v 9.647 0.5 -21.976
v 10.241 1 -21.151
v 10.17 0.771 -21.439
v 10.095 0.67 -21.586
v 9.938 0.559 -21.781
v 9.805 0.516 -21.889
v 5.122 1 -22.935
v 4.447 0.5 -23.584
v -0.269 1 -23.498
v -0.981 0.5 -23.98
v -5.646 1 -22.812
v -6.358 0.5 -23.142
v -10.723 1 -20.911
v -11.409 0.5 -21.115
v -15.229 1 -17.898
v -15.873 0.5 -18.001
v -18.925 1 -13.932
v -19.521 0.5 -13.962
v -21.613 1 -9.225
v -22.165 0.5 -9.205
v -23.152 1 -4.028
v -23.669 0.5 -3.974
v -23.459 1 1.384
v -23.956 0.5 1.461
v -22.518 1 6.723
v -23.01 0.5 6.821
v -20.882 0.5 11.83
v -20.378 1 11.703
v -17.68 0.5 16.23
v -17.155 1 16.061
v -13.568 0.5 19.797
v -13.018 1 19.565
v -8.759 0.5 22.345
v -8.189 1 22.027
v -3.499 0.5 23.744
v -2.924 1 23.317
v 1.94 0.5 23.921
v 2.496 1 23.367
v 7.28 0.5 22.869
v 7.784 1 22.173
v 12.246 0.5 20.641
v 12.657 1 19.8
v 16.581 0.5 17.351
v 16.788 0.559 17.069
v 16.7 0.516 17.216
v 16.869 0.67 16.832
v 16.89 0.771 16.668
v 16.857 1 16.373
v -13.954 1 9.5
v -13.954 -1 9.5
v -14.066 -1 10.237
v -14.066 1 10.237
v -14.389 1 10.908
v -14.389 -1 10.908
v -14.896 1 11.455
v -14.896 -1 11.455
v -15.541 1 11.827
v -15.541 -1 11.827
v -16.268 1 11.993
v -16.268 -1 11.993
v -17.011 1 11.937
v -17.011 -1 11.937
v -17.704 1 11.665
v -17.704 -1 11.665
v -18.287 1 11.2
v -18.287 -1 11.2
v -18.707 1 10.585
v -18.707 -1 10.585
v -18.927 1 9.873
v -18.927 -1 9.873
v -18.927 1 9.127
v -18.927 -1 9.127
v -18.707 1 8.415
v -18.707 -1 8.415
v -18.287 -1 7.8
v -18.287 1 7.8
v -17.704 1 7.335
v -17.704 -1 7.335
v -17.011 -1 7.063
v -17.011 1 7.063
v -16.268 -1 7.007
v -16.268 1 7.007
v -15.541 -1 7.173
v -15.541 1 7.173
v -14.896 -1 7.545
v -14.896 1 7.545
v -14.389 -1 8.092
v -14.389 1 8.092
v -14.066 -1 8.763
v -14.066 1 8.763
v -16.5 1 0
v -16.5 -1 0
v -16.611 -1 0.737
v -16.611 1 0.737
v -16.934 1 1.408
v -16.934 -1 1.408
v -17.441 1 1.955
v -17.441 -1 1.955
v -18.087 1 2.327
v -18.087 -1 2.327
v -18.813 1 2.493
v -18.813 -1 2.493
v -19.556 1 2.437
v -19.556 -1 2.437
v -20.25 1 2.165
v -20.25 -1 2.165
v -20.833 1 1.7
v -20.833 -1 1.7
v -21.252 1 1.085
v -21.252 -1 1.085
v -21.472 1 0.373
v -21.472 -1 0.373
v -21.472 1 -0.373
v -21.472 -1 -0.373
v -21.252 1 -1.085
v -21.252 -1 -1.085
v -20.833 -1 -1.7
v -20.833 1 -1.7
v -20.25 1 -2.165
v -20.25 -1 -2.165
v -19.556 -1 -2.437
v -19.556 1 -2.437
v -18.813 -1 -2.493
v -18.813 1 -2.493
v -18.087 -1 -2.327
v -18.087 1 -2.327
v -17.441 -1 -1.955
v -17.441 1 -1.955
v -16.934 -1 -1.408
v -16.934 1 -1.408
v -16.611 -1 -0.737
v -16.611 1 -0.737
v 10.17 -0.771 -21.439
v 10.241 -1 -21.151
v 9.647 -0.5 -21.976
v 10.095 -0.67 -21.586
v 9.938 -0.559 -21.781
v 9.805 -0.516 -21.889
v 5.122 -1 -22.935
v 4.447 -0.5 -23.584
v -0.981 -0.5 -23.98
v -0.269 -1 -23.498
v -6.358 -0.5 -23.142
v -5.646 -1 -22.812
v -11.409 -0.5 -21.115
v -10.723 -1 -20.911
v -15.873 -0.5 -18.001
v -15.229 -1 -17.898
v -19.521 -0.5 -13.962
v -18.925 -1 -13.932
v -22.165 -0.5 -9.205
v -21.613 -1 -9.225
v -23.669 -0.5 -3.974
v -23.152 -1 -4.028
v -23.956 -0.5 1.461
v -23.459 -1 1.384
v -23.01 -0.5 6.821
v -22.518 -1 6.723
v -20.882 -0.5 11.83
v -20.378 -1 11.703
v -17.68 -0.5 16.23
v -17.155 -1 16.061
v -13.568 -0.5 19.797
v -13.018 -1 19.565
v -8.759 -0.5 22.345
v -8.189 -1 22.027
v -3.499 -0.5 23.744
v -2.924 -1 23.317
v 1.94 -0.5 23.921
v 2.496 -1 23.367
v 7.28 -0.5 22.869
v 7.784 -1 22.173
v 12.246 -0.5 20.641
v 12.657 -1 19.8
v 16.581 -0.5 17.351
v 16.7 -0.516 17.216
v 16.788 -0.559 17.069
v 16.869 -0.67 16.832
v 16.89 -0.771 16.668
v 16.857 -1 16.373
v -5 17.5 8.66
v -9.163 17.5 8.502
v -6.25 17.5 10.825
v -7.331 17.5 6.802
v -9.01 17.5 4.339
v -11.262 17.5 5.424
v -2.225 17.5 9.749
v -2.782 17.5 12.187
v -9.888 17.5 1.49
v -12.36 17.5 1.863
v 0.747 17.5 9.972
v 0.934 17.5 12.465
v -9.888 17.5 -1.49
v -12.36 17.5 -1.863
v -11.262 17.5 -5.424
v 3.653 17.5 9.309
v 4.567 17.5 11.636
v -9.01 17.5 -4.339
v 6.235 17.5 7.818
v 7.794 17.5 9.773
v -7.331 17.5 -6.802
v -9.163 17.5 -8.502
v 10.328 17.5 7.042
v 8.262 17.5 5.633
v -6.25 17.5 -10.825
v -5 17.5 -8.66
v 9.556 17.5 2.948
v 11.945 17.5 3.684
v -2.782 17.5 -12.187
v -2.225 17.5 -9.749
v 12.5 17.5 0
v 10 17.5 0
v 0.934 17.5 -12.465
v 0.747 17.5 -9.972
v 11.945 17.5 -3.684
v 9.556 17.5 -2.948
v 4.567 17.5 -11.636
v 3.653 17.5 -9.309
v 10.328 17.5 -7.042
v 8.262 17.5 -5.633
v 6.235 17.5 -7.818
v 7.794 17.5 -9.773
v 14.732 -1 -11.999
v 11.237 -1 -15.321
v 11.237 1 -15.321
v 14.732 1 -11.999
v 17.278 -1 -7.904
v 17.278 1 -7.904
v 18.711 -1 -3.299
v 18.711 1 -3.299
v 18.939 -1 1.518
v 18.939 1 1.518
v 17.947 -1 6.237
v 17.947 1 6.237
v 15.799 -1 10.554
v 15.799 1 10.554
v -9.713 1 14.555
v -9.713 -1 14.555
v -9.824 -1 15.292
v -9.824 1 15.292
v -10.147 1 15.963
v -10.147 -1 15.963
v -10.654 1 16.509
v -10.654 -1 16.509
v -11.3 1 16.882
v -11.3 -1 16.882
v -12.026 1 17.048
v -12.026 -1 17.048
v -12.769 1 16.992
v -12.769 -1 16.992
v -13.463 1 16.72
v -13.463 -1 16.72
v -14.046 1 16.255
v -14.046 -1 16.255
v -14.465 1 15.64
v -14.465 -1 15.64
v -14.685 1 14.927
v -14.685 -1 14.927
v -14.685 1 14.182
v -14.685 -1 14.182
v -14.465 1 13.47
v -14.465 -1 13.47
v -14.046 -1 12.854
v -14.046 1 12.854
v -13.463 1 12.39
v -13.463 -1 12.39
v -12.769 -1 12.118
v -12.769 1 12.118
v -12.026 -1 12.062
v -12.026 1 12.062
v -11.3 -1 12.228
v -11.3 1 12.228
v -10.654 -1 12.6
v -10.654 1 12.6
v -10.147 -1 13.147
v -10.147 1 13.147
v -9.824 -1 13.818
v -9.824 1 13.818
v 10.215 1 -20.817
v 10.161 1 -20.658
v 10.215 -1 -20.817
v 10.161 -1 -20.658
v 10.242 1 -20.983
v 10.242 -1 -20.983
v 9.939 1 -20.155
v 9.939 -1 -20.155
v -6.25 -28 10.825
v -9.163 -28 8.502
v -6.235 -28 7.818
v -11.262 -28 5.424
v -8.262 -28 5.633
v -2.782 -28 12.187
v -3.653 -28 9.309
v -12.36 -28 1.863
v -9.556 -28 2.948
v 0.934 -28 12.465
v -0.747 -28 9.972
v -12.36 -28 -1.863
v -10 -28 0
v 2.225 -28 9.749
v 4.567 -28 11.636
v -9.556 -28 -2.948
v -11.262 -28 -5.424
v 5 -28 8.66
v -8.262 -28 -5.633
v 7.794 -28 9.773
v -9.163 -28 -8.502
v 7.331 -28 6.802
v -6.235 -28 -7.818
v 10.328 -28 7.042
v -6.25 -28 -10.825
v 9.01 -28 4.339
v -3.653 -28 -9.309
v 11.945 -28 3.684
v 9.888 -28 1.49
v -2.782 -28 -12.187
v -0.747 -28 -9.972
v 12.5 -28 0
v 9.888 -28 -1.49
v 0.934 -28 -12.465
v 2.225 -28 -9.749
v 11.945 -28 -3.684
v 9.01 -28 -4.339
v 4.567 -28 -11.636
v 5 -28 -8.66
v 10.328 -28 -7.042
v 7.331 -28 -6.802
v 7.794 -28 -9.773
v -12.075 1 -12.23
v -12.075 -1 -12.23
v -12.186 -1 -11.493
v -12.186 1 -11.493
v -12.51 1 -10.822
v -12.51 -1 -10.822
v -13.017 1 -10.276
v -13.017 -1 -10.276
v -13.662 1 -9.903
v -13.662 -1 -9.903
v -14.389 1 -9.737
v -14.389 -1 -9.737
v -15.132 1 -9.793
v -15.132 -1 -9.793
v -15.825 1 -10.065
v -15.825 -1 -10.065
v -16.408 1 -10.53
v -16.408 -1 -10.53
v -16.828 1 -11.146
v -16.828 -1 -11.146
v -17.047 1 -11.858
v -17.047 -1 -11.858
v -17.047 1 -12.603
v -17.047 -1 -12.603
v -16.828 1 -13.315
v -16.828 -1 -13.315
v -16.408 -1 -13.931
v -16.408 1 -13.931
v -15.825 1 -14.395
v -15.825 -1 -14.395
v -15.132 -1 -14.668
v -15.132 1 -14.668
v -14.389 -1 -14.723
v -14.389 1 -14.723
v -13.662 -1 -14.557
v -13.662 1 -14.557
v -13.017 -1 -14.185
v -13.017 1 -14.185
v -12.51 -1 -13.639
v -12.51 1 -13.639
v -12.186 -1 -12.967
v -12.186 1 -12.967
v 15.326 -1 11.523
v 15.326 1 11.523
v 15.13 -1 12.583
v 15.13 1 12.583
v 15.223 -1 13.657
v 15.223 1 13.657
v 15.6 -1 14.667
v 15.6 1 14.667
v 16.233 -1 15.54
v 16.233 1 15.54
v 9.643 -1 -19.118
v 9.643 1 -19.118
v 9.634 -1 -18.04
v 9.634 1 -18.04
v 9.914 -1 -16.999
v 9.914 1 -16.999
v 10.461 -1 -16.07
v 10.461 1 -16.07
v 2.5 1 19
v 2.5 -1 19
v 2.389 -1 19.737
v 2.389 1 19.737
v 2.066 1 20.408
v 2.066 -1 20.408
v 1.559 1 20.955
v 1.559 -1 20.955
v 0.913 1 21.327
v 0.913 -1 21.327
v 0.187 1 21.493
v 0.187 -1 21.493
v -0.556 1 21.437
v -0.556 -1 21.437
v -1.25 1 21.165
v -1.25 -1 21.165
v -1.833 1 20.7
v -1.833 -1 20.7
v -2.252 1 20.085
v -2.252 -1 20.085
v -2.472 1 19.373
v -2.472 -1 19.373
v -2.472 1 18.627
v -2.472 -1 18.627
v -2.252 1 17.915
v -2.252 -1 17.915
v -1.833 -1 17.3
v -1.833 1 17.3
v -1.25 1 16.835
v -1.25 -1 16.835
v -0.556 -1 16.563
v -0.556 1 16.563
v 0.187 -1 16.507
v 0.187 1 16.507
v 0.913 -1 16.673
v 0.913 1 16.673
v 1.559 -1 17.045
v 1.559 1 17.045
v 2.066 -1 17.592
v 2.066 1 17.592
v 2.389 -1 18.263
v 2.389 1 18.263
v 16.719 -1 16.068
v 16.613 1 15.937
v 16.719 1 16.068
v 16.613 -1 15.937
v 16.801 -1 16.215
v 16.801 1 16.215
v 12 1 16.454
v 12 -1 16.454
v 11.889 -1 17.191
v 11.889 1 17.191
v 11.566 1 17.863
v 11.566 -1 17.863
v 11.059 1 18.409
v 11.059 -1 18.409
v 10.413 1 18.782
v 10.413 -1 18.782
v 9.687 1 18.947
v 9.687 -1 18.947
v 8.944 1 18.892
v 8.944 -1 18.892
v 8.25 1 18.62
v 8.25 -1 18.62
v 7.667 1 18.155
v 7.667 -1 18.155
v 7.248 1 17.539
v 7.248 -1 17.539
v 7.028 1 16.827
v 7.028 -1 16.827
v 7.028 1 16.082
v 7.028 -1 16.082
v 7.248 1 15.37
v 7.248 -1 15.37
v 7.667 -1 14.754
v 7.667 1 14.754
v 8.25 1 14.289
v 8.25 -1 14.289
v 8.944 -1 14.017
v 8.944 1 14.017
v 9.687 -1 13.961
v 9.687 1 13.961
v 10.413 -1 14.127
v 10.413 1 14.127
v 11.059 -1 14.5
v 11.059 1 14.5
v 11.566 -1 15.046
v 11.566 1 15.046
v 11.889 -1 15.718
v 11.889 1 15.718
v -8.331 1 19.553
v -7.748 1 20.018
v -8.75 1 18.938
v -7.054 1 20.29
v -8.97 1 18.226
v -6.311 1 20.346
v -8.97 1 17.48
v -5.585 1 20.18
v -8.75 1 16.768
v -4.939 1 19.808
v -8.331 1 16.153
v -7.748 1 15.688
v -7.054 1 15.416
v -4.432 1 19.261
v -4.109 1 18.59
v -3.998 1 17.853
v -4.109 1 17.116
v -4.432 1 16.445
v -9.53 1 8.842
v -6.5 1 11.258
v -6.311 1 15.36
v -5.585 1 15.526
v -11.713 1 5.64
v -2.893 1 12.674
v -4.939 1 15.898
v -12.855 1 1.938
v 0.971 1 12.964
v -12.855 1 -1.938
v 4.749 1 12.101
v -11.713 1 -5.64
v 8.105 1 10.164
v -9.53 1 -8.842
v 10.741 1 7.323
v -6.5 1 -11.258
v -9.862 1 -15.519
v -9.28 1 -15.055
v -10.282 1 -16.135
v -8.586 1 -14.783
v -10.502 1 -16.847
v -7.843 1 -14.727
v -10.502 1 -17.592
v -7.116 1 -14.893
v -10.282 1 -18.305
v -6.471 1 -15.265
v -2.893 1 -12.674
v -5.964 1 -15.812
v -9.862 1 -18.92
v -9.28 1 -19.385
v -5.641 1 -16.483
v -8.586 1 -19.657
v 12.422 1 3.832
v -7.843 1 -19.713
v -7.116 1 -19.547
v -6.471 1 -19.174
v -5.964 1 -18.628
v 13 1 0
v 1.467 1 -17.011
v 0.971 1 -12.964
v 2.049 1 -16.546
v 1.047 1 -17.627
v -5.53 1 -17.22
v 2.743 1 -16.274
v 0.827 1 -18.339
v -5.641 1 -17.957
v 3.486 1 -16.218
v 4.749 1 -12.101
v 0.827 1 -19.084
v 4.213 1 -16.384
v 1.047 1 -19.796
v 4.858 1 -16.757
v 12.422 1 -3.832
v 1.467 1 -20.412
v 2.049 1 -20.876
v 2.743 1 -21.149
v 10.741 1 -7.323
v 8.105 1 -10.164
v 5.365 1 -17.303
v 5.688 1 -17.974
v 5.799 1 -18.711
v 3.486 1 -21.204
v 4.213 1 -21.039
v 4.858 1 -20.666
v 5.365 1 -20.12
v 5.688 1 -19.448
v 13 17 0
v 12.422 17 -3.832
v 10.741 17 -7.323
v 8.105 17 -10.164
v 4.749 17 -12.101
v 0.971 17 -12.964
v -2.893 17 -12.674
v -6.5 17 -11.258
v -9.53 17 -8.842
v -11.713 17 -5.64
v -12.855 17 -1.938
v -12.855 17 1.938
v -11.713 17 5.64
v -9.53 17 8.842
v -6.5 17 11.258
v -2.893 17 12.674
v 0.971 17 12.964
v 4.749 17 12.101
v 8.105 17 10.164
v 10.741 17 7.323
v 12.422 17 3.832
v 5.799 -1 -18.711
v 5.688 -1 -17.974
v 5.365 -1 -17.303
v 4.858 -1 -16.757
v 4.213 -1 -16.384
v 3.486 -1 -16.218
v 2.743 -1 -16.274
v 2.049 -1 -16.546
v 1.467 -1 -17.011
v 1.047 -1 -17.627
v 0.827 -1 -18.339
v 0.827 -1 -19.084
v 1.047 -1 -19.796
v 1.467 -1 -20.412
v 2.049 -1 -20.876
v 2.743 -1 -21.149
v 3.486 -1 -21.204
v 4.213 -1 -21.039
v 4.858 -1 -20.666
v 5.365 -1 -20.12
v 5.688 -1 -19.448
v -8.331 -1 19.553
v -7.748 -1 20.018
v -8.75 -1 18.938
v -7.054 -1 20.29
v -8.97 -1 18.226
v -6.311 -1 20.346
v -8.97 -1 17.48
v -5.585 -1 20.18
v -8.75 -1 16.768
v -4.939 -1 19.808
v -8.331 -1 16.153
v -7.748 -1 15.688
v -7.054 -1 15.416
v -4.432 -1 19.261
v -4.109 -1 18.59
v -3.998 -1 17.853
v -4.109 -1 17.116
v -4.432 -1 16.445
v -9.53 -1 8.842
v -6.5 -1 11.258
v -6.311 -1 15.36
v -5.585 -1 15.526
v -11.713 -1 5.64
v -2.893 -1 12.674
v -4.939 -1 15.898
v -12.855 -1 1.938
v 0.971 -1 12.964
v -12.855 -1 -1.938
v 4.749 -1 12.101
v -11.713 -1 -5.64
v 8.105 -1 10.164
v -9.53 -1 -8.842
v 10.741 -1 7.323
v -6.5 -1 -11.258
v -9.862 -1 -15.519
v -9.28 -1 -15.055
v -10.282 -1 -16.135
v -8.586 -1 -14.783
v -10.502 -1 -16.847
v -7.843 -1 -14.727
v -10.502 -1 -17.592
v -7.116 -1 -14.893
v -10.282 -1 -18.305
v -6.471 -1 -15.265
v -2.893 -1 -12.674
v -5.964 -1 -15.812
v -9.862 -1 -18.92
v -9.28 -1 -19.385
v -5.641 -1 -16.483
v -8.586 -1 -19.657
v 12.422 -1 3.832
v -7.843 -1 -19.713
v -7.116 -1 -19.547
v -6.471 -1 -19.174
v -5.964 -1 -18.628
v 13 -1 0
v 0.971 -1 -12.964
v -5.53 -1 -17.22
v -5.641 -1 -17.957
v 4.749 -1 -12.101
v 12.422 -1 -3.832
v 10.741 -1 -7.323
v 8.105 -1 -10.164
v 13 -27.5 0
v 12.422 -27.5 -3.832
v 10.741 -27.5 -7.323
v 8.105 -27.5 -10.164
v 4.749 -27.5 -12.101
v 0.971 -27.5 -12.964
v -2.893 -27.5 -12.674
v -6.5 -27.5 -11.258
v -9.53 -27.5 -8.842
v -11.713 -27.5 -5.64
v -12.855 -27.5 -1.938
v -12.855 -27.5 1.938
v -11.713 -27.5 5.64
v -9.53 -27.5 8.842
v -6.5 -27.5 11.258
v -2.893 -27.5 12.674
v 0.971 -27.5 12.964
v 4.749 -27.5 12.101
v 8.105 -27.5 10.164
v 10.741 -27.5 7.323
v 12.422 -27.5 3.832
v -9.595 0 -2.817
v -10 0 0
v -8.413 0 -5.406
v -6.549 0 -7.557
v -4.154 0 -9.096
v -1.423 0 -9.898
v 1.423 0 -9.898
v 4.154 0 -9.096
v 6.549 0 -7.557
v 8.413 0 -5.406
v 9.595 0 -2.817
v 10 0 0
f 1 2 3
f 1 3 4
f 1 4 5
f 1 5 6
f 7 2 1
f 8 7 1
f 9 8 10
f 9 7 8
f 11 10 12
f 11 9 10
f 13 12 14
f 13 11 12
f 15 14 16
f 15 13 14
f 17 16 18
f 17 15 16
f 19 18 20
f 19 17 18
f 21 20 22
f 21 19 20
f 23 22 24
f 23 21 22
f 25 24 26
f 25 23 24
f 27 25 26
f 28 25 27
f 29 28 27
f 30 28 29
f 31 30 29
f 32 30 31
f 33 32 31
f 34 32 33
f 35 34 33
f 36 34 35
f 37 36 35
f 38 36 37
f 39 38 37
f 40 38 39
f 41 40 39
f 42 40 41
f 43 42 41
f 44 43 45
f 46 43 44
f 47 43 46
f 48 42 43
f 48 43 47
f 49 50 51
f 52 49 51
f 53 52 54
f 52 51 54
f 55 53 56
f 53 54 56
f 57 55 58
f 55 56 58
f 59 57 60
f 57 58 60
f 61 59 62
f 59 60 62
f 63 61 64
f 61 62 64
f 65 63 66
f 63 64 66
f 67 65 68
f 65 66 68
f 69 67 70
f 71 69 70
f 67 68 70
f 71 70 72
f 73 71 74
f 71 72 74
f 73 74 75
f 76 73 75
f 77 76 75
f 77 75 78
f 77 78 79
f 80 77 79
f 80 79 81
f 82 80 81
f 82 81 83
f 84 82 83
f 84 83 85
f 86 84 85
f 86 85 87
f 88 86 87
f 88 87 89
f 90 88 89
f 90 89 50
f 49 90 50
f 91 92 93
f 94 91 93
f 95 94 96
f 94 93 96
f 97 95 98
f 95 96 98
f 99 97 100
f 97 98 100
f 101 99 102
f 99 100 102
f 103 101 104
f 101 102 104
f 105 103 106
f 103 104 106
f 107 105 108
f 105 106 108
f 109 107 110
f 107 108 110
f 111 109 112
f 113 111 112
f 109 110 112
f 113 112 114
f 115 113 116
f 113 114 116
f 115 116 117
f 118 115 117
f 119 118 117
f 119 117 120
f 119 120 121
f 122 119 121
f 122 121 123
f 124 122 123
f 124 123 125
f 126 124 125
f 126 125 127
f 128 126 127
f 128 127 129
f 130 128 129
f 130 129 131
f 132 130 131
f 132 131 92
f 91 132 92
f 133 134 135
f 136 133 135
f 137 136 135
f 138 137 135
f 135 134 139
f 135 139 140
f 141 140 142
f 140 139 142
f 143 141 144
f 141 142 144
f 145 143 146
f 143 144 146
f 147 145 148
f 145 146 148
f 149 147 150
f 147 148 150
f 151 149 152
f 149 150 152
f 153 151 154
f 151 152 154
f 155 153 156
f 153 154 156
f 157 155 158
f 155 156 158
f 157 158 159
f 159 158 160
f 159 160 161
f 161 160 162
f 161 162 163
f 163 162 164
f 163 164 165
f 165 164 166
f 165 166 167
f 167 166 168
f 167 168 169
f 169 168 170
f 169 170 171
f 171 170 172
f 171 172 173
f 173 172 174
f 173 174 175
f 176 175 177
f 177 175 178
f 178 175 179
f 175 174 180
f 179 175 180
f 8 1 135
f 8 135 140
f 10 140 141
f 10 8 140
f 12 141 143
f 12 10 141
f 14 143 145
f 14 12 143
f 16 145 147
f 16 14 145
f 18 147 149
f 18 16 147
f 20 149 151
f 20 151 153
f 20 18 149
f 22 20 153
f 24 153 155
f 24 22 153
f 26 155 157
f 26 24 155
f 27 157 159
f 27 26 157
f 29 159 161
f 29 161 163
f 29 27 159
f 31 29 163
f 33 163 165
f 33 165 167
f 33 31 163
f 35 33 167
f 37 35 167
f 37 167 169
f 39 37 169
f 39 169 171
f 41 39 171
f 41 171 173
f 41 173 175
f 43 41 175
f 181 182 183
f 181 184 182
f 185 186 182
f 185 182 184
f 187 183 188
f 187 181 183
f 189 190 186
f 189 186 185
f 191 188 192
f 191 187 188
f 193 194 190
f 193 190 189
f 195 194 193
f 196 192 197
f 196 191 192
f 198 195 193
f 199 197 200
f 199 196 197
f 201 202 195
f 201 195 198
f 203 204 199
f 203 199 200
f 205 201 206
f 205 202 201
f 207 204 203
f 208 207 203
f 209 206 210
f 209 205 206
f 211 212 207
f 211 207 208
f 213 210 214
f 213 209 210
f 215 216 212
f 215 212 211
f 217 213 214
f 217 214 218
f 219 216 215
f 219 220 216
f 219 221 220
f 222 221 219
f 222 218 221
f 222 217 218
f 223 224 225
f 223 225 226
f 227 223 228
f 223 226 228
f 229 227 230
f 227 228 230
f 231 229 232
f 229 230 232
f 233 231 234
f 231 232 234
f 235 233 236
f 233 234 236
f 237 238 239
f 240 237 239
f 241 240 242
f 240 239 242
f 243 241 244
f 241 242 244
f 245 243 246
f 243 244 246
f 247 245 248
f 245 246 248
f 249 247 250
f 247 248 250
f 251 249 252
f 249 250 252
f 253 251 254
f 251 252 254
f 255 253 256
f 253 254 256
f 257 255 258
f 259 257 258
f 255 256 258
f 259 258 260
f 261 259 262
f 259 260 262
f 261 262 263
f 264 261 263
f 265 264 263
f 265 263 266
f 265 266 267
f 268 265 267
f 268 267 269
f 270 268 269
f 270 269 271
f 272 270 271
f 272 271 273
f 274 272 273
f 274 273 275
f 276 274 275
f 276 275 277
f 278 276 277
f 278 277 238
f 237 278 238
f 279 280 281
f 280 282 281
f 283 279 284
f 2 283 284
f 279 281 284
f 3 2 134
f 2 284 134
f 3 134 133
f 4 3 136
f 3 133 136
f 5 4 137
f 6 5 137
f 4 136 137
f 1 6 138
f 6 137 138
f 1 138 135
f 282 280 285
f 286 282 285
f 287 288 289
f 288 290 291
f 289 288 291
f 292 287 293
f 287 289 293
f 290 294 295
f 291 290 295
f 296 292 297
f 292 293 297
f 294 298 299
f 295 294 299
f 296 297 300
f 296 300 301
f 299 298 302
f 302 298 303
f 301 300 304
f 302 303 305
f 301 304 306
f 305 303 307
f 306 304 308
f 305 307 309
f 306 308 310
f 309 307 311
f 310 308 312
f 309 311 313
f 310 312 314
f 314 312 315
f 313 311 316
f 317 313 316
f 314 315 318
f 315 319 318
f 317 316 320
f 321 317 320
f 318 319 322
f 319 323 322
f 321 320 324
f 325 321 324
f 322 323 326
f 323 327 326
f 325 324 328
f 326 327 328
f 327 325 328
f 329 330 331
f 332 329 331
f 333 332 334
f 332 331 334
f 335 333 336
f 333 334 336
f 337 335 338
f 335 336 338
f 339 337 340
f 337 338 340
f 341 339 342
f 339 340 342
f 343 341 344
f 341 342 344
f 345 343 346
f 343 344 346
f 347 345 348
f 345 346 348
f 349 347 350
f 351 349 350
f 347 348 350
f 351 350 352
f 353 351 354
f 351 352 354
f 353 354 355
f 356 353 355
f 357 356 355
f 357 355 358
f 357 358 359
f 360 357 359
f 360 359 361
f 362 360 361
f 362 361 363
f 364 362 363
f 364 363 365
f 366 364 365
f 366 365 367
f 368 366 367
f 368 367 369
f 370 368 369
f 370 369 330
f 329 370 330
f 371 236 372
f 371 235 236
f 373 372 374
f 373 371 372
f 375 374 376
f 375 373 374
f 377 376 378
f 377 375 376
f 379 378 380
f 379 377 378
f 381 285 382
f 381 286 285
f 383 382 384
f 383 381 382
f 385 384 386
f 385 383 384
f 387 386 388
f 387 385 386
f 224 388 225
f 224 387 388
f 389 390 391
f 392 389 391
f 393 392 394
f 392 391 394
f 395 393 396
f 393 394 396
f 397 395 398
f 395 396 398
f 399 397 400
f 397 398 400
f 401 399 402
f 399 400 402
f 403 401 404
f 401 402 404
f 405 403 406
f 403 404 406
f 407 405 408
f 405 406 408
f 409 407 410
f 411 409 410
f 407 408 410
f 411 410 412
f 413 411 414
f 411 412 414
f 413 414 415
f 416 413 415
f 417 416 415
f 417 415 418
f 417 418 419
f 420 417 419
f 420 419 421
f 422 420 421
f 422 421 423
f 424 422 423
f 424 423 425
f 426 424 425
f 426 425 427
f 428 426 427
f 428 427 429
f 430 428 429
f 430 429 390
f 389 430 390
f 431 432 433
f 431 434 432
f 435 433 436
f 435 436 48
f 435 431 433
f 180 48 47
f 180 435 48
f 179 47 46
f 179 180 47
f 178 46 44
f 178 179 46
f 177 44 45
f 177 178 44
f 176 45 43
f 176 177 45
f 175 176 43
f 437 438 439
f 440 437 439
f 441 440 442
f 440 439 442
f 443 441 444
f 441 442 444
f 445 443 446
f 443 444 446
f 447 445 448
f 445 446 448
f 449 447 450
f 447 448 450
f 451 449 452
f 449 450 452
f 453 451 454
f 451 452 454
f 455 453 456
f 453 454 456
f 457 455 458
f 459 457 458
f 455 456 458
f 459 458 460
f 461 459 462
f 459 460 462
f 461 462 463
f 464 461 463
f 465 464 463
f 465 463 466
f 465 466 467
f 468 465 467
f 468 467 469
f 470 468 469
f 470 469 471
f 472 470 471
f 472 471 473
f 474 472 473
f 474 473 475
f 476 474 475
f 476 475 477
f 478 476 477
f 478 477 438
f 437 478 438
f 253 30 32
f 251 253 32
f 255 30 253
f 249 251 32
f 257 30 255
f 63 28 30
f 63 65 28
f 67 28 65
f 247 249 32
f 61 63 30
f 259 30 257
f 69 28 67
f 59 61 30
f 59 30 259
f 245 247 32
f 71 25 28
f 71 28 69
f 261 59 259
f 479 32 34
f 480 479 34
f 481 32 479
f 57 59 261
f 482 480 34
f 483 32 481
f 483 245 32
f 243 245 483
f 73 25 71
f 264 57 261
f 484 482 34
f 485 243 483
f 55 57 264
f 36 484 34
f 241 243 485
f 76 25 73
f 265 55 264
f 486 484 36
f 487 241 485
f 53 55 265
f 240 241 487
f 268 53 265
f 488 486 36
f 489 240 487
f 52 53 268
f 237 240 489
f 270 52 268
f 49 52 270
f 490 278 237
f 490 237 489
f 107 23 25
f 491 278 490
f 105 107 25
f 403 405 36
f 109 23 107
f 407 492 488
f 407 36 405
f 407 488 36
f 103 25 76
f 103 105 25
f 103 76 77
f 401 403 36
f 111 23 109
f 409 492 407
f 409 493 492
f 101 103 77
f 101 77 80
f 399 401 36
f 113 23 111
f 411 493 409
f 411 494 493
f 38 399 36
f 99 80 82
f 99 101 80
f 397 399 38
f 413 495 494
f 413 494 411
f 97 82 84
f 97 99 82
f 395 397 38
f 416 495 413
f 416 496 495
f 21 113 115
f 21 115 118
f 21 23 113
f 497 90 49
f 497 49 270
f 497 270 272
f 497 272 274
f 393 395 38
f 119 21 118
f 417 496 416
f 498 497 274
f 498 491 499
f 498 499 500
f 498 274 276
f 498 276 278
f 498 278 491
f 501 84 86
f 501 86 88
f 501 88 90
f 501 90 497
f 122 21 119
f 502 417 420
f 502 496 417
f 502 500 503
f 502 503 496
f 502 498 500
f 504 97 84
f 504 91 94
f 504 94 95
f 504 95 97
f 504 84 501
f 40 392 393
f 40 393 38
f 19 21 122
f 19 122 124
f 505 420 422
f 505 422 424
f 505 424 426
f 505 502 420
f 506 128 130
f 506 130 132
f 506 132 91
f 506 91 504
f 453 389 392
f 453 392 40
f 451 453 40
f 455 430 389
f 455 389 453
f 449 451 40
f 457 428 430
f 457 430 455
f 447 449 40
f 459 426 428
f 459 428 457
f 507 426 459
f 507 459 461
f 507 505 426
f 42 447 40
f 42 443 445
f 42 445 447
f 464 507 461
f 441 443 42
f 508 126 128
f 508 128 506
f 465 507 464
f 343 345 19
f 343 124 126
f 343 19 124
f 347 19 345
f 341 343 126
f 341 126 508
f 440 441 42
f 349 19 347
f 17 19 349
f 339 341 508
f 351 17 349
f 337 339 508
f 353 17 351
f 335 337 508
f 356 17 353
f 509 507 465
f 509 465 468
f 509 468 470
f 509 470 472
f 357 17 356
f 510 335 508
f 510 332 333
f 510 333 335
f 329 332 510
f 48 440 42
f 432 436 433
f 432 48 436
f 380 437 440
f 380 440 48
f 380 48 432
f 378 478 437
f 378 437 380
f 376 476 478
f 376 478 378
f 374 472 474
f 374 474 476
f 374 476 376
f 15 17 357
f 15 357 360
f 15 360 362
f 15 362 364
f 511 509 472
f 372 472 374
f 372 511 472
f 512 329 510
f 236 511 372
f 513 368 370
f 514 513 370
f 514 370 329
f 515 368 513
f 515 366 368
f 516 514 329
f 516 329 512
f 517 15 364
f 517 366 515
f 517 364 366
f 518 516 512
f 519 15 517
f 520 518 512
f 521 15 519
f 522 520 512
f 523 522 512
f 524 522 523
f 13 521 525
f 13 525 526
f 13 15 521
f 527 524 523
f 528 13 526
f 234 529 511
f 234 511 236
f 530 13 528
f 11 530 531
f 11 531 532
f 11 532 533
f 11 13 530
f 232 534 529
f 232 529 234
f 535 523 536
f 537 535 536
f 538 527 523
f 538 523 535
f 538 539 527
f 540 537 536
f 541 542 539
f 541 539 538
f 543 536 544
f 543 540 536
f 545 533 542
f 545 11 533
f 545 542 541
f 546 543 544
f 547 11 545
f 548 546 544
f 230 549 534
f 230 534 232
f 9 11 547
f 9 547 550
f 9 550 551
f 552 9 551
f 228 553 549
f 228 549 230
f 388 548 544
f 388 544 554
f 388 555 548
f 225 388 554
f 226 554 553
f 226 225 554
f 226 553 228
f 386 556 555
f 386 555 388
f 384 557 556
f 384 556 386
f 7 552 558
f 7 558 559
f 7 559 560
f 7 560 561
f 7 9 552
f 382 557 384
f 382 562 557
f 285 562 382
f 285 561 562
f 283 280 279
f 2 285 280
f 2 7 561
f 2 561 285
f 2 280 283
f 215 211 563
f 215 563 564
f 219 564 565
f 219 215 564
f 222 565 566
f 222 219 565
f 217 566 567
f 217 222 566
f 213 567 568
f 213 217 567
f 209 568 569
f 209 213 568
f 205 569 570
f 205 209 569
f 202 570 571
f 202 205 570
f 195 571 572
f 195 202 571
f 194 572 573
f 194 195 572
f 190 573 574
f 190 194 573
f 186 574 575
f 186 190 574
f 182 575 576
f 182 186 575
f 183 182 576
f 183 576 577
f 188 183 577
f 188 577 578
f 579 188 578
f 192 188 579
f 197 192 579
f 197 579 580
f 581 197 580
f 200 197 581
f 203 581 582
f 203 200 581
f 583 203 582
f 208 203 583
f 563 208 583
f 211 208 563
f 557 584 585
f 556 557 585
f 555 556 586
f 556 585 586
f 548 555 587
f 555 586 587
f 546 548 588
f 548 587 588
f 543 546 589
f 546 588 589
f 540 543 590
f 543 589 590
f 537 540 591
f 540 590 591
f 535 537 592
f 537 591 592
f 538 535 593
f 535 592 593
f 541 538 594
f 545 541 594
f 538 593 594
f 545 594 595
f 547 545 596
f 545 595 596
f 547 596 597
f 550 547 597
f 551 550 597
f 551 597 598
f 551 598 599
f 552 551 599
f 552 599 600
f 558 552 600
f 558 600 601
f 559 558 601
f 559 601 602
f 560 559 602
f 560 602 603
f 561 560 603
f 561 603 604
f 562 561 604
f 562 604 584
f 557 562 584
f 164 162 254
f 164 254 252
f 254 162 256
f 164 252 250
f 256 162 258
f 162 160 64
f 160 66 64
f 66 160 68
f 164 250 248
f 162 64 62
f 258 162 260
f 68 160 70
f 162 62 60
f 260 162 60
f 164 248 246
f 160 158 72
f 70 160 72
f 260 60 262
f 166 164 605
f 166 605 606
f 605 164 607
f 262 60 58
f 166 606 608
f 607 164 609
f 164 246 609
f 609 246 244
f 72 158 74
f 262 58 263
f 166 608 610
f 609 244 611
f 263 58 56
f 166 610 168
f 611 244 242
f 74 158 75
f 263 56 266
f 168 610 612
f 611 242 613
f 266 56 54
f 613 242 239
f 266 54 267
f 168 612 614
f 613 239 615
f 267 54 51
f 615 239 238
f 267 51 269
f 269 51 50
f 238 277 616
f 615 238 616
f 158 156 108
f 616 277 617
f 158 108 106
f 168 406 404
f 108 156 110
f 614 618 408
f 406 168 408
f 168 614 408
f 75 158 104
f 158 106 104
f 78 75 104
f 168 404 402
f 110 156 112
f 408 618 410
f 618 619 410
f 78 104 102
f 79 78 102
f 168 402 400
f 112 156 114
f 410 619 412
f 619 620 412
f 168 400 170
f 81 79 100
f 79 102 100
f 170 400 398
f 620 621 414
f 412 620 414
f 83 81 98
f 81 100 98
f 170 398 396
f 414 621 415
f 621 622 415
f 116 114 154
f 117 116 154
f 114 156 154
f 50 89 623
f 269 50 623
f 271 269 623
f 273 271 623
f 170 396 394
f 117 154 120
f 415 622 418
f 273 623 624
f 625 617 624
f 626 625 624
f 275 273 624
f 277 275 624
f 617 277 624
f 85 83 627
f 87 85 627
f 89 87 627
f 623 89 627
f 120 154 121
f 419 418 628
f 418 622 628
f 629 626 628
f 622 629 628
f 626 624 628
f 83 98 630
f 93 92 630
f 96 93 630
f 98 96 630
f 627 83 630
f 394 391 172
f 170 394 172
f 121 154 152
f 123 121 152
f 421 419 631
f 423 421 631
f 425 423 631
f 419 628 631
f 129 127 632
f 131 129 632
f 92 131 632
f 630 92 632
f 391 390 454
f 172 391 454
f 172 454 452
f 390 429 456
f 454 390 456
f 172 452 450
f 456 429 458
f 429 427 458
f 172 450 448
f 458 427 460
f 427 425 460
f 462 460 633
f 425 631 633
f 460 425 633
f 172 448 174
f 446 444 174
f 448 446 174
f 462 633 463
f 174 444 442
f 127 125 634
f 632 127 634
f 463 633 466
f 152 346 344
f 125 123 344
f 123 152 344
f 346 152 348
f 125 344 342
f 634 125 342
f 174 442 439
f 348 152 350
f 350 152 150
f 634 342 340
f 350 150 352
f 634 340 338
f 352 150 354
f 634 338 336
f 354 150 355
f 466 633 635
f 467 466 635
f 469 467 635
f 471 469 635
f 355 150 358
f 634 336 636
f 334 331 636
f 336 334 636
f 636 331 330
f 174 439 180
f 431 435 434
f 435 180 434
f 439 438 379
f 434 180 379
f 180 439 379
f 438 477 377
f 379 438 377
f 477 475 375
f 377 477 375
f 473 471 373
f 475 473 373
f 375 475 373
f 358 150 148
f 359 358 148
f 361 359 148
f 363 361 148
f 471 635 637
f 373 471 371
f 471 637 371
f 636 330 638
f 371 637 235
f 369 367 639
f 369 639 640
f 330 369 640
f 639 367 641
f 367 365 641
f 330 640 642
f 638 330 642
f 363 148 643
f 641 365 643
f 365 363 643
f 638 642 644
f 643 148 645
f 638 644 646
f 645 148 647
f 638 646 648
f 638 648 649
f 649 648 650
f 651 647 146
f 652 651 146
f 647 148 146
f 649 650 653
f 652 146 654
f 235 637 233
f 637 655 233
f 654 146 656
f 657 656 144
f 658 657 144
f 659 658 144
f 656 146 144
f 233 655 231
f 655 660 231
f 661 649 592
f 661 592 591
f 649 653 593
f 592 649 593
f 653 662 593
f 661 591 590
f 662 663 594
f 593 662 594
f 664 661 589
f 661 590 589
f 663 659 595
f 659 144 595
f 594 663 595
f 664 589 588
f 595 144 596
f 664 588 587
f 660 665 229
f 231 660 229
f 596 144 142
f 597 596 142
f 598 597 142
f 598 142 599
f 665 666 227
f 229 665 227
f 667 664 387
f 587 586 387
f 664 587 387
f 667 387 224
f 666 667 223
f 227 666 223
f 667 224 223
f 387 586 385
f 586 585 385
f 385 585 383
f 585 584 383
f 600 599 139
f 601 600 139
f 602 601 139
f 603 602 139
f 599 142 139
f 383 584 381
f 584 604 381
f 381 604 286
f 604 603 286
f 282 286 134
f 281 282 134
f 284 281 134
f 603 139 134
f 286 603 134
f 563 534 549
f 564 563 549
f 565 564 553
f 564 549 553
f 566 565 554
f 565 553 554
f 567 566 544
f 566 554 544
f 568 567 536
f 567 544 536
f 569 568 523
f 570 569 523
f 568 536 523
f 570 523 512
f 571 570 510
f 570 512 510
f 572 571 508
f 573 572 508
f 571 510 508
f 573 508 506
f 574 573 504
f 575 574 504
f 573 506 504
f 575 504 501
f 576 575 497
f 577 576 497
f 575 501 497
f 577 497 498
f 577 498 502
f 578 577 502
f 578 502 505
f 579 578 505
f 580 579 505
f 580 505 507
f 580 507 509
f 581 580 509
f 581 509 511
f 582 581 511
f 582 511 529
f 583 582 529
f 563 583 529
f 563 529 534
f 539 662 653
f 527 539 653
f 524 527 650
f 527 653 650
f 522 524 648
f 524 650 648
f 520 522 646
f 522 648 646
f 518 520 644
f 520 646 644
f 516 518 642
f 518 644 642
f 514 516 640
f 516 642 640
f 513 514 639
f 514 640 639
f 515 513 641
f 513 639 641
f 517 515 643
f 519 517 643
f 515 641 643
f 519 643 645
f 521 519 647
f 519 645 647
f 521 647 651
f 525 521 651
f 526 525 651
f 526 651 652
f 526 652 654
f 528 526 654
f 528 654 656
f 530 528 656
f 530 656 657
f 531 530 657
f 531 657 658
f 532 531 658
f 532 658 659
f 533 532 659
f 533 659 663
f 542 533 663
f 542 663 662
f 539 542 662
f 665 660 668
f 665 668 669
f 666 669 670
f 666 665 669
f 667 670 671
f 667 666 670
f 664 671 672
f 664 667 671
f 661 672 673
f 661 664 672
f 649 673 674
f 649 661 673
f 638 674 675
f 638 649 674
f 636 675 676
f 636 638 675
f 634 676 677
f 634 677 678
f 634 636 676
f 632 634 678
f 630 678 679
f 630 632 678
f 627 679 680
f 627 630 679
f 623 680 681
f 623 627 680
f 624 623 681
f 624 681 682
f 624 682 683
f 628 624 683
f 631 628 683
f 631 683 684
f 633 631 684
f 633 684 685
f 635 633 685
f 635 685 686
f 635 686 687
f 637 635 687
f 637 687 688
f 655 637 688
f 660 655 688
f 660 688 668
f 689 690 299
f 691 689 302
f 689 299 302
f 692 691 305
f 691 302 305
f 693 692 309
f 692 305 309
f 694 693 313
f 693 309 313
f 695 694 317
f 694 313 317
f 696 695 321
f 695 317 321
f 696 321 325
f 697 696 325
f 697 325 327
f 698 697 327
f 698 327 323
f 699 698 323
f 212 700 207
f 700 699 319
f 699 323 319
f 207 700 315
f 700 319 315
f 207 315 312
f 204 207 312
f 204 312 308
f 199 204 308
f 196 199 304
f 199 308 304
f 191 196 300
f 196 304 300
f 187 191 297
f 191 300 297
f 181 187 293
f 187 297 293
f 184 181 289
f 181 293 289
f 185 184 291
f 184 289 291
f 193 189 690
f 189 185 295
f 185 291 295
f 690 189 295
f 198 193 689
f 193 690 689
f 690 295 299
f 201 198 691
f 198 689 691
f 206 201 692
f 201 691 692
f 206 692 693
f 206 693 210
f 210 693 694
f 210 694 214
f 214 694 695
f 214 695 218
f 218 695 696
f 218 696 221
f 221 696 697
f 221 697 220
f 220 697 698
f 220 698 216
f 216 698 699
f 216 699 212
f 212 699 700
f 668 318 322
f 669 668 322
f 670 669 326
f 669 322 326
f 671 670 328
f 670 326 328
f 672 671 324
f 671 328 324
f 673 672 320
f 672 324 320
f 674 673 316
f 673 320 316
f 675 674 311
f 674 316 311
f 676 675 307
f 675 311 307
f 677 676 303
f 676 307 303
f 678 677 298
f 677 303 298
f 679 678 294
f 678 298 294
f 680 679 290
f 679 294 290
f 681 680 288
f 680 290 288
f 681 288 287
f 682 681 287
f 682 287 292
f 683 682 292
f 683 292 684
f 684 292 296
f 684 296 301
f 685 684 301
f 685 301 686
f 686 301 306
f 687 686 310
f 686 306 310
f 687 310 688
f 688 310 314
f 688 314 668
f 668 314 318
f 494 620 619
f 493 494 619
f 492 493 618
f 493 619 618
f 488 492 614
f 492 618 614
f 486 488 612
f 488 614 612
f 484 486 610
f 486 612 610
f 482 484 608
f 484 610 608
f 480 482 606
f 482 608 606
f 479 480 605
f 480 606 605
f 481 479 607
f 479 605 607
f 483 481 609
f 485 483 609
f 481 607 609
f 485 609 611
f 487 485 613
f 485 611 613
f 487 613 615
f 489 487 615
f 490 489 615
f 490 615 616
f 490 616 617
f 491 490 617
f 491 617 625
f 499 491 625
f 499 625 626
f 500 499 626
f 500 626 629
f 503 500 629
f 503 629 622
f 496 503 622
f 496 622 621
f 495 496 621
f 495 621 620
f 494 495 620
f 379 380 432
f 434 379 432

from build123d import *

# Parameters (mm, degrees)
SKETCH1_R                       = 13
BOSS_EXTRUDE1_DEPTH             = 28
SKETCH3_R                       = 24
BOSS_EXTRUDE2_DEPTH             = 1
SKETCH2_R                       = 10
CUT_EXTRUDE1_DEPTH              = 1
CUT_EXTRUDE1_DEPTH_BACK         = 30
SKETCH9_R                       = 13
BOSS_EXTRUDE3_DEPTH             = 17.5
CHAMFER2_SIZE                   = 0.5
CHAMFER3_SIZE                   = 0.5
CHAMFER4_SIZE                   = 0.5
SKETCH11_R                      = 10
CUT_EXTRUDE5_DEPTH              = 1
CUT_EXTRUDE5_DEPTH_BACK         = 46.5
CHAMFER5_SIZE                   = 0.5
SKETCH7_R                       = 2.5
WYTNIJ_WYCI_GNI_CIE1_DEPTH      = 28
WYTNIJ_WYCI_GNI_CIE1_DEPTH_BACK = 19.5
WYTNIJ_WYCI_GNI_CIE2_DEPTH      = 10
ZAOKR_GLENIE1_R                 = 4
ZAOKR_GLENIE2_R                 = 1


with BuildPart() as part:
    # Sketch1 → Boss-Extrude1 (new body)
    with BuildSketch(Plane(origin=(0, 0, 0), x_dir=(1, 0, 0), z_dir=(0, 1, 0))):
        Circle(SKETCH1_R)
    extrude(amount=-BOSS_EXTRUDE1_DEPTH)

    # Sketch3 → Boss-Extrude2 (add, symmetric)
    with BuildSketch(Plane(origin=(0, 0, 0), x_dir=(1, 0, 0), z_dir=(0, 1, 0))):
        Circle(SKETCH3_R)
    extrude(amount=BOSS_EXTRUDE2_DEPTH, both=True)

    # Sketch2 → Cut-Extrude1 (cut, two sides)
    with BuildSketch(Plane(origin=(0, -28, 0), x_dir=(-1, 0, 0), z_dir=(0, -1, 0))) as cut_extrude1_sk:
        Circle(SKETCH2_R)
    extrude(amount=CUT_EXTRUDE1_DEPTH, mode=Mode.SUBTRACT)
    extrude(cut_extrude1_sk.sketch, amount=-CUT_EXTRUDE1_DEPTH_BACK, mode=Mode.SUBTRACT)

    # Sketch9 → Boss-Extrude3 (add)
    with BuildSketch(Plane(origin=(0, 0, 0), x_dir=(1, 0, 0), z_dir=(0, 1, 0))):
        Circle(SKETCH9_R)
    extrude(amount=BOSS_EXTRUDE3_DEPTH)

    # Chamfer2
    chamfer2_edges = [part.edges().sort_by_distance(p)[0] for p in [
        (-24, -1, 0),
    ]]
    chamfer(chamfer2_edges, length=CHAMFER2_SIZE)

    # Chamfer3
    chamfer3_edges = [part.edges().sort_by_distance(p)[0] for p in [
        (-24, 1, 0),
    ]]
    chamfer(chamfer3_edges, length=CHAMFER3_SIZE)

    # Chamfer4
    chamfer4_edges = [part.edges().sort_by_distance(p)[0] for p in [
        (-13, -28, 0),
    ]]
    chamfer(chamfer4_edges, length=CHAMFER4_SIZE)

    # Sketch11 → Cut-Extrude5 (cut, two sides)
    with BuildSketch(Plane(origin=(0, 17.5, 0), x_dir=(1, 0, 0), z_dir=(0, 1, 0))) as cut_extrude5_sk:
        Circle(SKETCH11_R)
    extrude(amount=CUT_EXTRUDE5_DEPTH, mode=Mode.SUBTRACT)
    extrude(cut_extrude5_sk.sketch, amount=-CUT_EXTRUDE5_DEPTH_BACK, mode=Mode.SUBTRACT)

    # Chamfer5
    chamfer5_edges = [part.edges().sort_by_distance(p)[0] for p in [
        (-13, 17.5, 0),
    ]]
    chamfer(chamfer5_edges, length=CHAMFER5_SIZE)

    # Sketch7 → Wytnij-wyciągnięcie1 (cut, two sides)
    with BuildSketch(Plane.XZ.offset(1)) as wytnij_wyci_gni_cie1_sk:
        with Locations((0, 19)):
            Circle(SKETCH7_R)
        with Locations((3.299315376, -18.711347307)):
            Circle(SKETCH7_R)
        with Locations((-6.497936067, 17.852932618)):
            Circle(SKETCH7_R)
        with Locations((9.5, 16.454482672)):
            Circle(SKETCH7_R)
        with Locations((-19, 0)):
            Circle(SKETCH7_R)
        with Locations((-8.029746973, -17.219847954)):
            Circle(SKETCH7_R)
        with Locations((-12.212964584, 14.554844419)):
            Circle(SKETCH7_R)
        with Locations((-14.575405337, -12.230217242)):
            Circle(SKETCH7_R)
        with Locations((-16.454482672, 9.5)):
            Circle(SKETCH7_R)
    extrude(amount=WYTNIJ_WYCI_GNI_CIE1_DEPTH, mode=Mode.SUBTRACT)
    extrude(wytnij_wyci_gni_cie1_sk.sketch, amount=-WYTNIJ_WYCI_GNI_CIE1_DEPTH_BACK, mode=Mode.SUBTRACT)

    # Szkic1 → Wytnij-wyciągnięcie2 (cut)
    with BuildSketch(Plane(origin=(0, 1, 0), x_dir=(1, 0, 0), z_dir=(0, 1, 0))):
        with BuildLine():
            Line((13.831592317, -13.026398351), (17.289813207, -16.645190274))
            ThreePointArc((17.289813207, -16.645190274), (23.635386072, 4.167556264), (10.554119522, 21.554826863))
            Line((10.554119522, 21.554826863), (8.542154603, 16.971493592))
            ThreePointArc((8.542154603, 16.971493592), (18.711347307, 3.299315376), (13.831592317, -13.026398351))
        make_face()
    extrude(amount=-WYTNIJ_WYCI_GNI_CIE2_DEPTH, mode=Mode.SUBTRACT)

    # Zaokrąglenie1
    zaokr_glenie1_edges = [part.edges().sort_by_distance(p)[0] for p in [
        (13.831592317, 0, 13.026398351),
        (8.542154603, 0, -16.971493592),
    ]]
    fillet(zaokr_glenie1_edges, radius=ZAOKR_GLENIE1_R)

    # Zaokrąglenie2
    zaokr_glenie2_edges = [part.edges().sort_by_distance(p)[0] for p in [
        (10.554119522, 0, -21.554826863),
        (17.289813207, 0, 16.645190274),
    ]]
    fillet(zaokr_glenie2_edges, radius=ZAOKR_GLENIE2_R)


solid = part.part
